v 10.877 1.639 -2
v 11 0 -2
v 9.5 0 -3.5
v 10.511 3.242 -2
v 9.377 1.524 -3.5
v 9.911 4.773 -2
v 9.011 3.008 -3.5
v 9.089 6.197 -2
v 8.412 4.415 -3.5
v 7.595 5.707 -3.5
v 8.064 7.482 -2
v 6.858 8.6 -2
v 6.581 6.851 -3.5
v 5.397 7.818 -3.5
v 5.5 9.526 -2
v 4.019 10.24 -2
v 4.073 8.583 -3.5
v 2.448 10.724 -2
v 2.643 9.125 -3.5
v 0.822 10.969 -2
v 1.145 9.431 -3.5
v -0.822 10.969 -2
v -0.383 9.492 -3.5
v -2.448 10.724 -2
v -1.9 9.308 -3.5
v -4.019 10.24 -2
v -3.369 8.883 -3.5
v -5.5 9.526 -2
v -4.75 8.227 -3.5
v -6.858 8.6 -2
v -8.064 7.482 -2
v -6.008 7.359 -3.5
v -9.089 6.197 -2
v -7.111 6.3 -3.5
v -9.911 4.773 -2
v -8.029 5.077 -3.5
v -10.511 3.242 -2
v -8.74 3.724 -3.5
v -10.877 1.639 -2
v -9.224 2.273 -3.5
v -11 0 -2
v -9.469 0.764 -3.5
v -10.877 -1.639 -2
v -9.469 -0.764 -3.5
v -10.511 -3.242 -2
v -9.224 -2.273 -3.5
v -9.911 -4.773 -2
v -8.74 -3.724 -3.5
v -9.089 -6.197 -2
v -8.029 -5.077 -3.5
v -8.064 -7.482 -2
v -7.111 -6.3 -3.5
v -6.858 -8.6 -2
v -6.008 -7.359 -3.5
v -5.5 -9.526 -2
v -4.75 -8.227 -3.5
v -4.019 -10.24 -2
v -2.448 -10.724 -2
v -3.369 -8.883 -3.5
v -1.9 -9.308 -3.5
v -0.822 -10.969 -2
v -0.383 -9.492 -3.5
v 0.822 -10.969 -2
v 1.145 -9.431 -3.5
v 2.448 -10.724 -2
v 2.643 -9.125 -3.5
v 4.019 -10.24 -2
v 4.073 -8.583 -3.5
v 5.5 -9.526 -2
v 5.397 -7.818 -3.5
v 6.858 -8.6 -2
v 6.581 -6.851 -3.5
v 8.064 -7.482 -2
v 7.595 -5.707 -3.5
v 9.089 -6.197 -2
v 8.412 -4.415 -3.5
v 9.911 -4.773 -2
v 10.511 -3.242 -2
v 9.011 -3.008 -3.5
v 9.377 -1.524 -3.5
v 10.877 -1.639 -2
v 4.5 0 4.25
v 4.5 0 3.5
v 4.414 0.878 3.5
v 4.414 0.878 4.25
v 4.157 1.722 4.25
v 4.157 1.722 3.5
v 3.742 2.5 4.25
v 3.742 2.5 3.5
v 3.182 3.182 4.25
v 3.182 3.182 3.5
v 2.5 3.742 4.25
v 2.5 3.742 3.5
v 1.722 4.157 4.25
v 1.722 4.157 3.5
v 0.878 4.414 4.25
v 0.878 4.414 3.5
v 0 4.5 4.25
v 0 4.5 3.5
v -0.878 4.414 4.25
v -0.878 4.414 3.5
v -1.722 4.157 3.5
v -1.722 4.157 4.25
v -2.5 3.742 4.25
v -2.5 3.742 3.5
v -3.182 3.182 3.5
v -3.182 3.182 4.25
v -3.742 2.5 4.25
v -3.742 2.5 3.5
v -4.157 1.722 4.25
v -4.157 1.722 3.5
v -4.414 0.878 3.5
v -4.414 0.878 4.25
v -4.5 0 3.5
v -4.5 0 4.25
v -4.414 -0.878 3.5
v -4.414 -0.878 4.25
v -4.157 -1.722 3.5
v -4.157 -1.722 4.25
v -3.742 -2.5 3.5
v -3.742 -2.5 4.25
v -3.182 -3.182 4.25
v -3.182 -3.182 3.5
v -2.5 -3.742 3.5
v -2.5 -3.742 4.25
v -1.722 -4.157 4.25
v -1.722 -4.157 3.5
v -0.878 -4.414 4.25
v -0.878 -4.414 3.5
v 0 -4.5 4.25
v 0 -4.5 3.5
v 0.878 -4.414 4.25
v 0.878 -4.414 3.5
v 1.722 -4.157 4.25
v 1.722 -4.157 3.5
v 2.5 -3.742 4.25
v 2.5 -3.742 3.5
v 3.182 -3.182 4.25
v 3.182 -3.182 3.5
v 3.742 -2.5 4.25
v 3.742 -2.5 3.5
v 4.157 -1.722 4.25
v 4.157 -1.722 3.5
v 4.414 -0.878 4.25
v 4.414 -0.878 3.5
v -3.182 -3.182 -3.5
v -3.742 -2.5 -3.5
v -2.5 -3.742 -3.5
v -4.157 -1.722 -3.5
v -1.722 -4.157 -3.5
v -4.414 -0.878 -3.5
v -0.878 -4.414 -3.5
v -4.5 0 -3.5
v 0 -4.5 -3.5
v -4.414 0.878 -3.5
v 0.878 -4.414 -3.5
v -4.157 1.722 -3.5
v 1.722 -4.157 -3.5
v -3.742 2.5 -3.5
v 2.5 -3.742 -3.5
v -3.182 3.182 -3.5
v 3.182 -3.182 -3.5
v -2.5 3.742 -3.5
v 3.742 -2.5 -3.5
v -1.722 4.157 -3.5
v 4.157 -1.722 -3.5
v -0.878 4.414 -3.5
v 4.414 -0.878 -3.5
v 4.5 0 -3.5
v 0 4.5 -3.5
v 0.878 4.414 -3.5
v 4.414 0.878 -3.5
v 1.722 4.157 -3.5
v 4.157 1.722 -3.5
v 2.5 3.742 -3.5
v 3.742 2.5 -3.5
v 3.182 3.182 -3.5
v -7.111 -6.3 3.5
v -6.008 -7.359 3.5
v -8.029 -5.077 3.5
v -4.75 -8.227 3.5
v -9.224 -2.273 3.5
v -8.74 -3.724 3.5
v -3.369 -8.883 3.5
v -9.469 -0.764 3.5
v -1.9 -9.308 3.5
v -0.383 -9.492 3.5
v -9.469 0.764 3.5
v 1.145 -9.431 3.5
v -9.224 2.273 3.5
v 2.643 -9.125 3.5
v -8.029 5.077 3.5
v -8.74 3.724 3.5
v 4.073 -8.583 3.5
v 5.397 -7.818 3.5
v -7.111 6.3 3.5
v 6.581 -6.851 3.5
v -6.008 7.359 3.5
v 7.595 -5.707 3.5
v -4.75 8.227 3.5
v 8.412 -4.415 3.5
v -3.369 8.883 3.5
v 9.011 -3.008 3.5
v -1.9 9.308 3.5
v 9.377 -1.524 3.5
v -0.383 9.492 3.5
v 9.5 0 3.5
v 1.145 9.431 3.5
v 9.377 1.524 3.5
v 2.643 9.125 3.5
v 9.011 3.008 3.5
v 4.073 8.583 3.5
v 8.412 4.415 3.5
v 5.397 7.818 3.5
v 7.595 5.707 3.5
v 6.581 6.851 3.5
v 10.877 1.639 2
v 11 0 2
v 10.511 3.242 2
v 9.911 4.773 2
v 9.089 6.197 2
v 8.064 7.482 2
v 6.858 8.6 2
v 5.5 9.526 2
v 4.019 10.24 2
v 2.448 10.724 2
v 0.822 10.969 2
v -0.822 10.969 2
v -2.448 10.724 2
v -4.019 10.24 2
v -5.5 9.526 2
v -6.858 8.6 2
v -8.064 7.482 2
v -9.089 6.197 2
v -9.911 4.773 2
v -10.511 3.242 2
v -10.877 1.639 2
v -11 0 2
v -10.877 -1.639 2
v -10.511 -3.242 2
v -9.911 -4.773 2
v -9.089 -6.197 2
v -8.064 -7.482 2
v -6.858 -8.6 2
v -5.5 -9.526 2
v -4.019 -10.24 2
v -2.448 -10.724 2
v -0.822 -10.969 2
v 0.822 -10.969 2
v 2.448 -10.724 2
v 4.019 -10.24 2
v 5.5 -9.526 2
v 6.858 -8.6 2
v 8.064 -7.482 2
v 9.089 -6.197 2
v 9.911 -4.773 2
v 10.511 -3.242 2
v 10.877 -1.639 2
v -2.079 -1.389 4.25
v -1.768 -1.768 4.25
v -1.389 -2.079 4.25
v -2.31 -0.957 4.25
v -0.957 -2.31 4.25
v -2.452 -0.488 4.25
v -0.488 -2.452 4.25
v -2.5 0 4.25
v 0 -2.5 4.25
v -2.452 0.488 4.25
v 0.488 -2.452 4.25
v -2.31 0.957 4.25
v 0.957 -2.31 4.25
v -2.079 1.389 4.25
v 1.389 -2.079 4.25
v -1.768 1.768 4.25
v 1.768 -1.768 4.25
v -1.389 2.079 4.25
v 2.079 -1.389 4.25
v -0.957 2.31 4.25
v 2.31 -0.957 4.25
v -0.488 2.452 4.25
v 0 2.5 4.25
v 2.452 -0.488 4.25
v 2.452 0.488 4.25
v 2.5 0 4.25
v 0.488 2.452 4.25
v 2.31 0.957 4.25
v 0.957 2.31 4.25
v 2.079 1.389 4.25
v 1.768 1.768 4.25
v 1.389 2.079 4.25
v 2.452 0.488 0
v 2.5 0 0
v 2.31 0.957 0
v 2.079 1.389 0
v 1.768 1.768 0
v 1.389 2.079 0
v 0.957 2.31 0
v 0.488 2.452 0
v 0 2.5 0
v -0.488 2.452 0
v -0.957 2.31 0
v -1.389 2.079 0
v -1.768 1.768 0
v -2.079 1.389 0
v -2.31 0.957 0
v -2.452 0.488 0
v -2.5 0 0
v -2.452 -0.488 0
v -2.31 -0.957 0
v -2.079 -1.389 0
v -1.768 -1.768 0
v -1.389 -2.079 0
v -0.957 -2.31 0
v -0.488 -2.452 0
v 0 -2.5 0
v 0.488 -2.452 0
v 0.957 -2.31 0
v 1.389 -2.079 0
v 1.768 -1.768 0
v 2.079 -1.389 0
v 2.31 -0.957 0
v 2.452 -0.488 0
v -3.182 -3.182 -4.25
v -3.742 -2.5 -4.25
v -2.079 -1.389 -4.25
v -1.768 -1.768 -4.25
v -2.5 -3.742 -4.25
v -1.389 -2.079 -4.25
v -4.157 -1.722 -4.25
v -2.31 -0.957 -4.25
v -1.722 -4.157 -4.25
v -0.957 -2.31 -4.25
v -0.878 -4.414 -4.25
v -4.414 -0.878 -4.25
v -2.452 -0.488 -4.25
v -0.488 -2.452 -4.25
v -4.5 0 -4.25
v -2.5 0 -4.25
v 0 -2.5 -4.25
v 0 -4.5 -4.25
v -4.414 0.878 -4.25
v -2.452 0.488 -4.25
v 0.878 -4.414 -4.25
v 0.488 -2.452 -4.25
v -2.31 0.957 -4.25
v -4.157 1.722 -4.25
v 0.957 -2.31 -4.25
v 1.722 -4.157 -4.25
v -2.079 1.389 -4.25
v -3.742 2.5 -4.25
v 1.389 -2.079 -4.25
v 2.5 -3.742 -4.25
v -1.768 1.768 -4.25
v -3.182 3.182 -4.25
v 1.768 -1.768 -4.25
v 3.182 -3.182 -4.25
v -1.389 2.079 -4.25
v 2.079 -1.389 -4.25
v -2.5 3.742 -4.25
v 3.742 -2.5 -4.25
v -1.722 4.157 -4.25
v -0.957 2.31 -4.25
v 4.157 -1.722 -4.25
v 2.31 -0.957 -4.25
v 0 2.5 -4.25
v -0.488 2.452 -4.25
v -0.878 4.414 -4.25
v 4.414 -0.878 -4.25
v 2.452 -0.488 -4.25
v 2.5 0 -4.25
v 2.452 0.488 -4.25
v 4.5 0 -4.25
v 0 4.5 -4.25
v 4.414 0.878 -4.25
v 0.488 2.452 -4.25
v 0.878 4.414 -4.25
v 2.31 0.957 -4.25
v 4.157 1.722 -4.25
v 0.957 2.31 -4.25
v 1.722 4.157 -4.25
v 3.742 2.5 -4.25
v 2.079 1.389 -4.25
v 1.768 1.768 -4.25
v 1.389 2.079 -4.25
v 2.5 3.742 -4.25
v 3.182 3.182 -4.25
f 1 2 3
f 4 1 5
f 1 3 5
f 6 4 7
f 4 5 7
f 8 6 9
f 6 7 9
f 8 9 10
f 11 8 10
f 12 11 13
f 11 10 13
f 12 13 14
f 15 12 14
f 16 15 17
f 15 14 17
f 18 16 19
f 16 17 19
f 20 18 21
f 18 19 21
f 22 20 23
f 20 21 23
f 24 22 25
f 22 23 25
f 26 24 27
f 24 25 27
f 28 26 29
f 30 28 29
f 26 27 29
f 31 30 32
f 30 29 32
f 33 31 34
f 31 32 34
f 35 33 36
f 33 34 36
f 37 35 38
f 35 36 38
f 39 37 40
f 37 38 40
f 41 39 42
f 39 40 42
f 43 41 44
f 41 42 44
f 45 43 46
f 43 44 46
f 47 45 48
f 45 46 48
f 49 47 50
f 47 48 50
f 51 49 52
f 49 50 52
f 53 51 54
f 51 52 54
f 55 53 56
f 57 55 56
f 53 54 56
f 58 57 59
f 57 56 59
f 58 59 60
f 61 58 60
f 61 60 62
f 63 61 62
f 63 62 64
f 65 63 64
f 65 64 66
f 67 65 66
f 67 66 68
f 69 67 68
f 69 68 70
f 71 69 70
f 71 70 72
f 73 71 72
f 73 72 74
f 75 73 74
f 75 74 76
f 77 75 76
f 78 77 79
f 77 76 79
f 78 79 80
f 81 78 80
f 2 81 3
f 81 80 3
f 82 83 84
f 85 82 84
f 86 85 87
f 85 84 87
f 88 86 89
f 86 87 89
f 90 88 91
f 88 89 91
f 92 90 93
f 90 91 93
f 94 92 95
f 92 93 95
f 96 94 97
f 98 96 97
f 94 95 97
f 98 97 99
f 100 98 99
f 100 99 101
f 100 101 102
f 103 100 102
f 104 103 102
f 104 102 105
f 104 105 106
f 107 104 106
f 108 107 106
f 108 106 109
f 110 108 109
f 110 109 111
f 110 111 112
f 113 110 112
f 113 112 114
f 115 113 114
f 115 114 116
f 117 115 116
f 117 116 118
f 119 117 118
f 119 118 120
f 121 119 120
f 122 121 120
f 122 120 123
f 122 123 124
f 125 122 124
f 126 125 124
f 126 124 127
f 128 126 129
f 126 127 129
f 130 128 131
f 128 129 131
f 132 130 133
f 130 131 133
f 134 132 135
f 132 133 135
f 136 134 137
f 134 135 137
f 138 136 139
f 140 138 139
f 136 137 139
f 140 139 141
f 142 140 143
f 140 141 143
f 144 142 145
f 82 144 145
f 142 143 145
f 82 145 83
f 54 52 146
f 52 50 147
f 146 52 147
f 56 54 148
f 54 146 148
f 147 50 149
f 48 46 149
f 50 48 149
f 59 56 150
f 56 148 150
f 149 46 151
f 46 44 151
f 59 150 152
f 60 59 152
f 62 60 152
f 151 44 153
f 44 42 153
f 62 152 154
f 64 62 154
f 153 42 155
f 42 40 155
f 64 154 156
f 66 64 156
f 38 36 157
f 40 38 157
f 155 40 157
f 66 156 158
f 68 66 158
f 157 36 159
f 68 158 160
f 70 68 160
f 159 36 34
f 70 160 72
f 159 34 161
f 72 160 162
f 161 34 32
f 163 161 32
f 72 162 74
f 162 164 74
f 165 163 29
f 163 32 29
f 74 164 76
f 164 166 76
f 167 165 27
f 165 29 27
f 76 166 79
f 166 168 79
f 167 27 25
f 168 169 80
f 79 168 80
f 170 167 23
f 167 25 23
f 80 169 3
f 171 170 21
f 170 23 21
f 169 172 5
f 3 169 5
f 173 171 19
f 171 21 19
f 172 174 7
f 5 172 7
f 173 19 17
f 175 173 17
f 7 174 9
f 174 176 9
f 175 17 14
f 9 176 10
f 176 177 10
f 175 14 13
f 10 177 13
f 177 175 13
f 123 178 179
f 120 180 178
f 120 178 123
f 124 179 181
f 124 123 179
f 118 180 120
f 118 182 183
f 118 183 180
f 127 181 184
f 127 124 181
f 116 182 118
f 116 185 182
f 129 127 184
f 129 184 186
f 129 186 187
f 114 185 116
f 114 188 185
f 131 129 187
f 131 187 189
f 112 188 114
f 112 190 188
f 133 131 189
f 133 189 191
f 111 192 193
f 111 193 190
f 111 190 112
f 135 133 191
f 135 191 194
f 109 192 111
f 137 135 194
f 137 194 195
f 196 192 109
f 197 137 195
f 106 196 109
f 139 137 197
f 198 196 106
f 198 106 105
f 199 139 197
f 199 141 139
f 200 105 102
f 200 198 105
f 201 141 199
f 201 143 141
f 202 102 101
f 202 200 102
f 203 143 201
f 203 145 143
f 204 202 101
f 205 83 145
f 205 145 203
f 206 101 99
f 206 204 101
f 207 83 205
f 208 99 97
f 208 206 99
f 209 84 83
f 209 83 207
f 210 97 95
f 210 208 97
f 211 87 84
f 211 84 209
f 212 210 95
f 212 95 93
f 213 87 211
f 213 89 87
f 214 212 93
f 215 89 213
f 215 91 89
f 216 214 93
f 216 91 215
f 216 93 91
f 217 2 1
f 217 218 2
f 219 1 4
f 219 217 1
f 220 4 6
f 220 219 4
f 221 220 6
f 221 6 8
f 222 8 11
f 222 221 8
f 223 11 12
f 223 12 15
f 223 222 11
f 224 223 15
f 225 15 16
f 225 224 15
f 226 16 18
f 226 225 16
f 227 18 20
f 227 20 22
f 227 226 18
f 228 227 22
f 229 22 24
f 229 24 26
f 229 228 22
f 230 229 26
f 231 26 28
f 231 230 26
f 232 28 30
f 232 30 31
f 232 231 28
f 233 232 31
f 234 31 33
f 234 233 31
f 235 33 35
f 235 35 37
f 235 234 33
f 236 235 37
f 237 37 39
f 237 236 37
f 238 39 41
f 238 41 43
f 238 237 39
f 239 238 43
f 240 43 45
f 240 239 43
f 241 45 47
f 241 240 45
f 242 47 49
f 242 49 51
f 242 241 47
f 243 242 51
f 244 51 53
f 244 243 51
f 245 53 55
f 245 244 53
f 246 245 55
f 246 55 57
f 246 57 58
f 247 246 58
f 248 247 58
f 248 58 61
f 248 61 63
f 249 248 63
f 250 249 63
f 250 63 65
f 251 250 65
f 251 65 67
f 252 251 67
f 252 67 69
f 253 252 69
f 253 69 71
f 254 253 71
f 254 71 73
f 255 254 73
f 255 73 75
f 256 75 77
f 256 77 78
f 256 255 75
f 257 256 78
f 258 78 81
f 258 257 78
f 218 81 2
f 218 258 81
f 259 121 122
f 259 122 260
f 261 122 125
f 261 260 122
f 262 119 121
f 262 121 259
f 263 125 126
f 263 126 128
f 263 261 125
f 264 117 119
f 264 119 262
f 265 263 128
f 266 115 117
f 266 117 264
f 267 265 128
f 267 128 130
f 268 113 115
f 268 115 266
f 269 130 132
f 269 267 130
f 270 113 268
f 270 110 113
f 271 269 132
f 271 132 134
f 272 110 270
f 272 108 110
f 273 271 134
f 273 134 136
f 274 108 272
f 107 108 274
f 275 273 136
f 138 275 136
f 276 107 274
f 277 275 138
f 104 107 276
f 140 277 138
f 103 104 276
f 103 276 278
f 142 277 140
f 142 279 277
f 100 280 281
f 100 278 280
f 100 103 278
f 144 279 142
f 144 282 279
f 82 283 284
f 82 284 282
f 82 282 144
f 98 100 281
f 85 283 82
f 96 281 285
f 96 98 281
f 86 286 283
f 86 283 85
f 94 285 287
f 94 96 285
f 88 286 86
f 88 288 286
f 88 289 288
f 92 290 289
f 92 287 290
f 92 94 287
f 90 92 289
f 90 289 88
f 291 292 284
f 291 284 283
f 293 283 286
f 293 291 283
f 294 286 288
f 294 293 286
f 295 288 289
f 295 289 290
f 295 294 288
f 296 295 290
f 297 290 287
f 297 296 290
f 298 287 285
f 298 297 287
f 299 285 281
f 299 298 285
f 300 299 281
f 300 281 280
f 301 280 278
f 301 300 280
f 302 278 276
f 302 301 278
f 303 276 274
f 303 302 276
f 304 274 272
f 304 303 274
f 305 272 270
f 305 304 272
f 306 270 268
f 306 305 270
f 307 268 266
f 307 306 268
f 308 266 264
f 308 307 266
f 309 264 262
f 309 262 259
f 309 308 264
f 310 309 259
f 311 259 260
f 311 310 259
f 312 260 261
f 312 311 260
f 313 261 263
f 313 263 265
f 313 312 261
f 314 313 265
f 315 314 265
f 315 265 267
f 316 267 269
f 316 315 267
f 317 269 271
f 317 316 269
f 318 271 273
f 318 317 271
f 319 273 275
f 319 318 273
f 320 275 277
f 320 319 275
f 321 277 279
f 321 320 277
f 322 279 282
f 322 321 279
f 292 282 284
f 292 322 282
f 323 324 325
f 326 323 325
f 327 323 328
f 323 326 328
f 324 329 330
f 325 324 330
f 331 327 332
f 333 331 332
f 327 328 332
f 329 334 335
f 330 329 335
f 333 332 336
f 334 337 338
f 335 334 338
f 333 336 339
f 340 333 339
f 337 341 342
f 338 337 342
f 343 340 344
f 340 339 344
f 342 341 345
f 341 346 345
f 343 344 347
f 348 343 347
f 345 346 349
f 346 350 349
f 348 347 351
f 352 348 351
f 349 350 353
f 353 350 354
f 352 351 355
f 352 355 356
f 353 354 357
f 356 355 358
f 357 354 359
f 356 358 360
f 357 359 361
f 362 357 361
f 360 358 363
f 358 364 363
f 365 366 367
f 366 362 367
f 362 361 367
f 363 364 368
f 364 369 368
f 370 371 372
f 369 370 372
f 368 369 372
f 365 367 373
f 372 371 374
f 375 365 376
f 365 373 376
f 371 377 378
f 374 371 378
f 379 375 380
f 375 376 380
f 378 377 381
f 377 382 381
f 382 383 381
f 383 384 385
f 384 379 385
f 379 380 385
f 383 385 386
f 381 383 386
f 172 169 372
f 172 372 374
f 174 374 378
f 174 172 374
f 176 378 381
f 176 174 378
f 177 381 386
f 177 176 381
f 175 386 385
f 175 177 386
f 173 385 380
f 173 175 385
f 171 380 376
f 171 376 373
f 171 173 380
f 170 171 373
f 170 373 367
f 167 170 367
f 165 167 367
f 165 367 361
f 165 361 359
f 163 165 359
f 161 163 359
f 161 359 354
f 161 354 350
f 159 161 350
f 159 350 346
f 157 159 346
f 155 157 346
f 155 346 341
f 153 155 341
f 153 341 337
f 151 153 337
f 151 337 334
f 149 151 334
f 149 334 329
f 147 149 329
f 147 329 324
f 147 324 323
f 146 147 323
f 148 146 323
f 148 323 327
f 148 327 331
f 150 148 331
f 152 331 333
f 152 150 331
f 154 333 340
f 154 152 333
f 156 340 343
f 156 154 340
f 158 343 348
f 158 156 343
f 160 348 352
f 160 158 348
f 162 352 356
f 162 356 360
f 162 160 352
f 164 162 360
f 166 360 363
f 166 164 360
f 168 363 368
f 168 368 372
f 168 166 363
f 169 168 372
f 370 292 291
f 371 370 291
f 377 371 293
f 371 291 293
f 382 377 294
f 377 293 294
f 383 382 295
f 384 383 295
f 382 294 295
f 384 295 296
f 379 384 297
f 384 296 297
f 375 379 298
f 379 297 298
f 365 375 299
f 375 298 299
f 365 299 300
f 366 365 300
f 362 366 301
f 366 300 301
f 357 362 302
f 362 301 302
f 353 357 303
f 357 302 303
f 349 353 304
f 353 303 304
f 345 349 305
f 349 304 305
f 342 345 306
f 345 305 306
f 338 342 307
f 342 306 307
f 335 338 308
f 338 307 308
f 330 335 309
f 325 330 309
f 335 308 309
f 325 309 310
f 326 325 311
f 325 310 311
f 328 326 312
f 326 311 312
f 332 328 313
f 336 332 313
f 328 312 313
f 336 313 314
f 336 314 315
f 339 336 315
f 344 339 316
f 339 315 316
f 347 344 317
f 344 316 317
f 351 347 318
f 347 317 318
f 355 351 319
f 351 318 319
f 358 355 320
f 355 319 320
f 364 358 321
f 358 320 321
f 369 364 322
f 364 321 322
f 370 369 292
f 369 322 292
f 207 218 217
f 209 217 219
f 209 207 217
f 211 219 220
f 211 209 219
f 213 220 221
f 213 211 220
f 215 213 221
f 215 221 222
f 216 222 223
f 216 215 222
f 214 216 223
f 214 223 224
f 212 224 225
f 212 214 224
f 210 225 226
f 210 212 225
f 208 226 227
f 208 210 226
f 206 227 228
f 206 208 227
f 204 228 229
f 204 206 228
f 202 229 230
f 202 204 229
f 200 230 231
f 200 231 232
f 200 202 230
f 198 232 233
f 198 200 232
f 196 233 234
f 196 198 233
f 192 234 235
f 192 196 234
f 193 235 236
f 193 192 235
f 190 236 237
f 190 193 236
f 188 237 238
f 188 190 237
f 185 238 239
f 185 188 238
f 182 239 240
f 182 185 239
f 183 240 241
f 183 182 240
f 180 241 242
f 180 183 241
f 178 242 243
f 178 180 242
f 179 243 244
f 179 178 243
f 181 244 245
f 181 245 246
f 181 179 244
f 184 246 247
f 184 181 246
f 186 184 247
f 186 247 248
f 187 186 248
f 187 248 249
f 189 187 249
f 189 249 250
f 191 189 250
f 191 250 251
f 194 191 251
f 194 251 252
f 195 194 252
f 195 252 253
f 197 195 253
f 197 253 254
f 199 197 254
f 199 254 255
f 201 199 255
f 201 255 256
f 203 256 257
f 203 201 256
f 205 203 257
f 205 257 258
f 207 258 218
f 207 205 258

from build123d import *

# Parameters (mm, degrees)
F0_R     = 4.5
F0_R_2   = 2.5
F1_DEPTH = 4.25
F0_R_3   = 11
F2_DEPTH = 3.5
F3_SIZE  = 1.5


with BuildPart() as f1:
    # F0 (on Top) → F1 (new body)
    with BuildSketch(Plane.XY):
        Circle(F0_R)
        Circle(F0_R_2, mode=Mode.SUBTRACT)
    extrude(amount=F1_DEPTH)

    # F0 (on Top) → F2 (join)
    with BuildSketch(Plane.XY):
        Circle(F0_R_3)
        Circle(F0_R, mode=Mode.SUBTRACT)
    extrude(amount=F2_DEPTH)

    # F3
    f3_edges = [f1.edges().sort_by_distance(p)[0] for p in [
        (-11, 0, 3.5),
    ]]
    chamfer(f3_edges, length=F3_SIZE)

    # F4: F1 across face


with BuildPart() as f1_1:
    add(f1.part)
    add(f1.part.mirror(Plane(origin=(0, 0, 0), x_dir=(1, 0, 0), z_dir=(0, 0, -1))))


solid = f1_1.part
